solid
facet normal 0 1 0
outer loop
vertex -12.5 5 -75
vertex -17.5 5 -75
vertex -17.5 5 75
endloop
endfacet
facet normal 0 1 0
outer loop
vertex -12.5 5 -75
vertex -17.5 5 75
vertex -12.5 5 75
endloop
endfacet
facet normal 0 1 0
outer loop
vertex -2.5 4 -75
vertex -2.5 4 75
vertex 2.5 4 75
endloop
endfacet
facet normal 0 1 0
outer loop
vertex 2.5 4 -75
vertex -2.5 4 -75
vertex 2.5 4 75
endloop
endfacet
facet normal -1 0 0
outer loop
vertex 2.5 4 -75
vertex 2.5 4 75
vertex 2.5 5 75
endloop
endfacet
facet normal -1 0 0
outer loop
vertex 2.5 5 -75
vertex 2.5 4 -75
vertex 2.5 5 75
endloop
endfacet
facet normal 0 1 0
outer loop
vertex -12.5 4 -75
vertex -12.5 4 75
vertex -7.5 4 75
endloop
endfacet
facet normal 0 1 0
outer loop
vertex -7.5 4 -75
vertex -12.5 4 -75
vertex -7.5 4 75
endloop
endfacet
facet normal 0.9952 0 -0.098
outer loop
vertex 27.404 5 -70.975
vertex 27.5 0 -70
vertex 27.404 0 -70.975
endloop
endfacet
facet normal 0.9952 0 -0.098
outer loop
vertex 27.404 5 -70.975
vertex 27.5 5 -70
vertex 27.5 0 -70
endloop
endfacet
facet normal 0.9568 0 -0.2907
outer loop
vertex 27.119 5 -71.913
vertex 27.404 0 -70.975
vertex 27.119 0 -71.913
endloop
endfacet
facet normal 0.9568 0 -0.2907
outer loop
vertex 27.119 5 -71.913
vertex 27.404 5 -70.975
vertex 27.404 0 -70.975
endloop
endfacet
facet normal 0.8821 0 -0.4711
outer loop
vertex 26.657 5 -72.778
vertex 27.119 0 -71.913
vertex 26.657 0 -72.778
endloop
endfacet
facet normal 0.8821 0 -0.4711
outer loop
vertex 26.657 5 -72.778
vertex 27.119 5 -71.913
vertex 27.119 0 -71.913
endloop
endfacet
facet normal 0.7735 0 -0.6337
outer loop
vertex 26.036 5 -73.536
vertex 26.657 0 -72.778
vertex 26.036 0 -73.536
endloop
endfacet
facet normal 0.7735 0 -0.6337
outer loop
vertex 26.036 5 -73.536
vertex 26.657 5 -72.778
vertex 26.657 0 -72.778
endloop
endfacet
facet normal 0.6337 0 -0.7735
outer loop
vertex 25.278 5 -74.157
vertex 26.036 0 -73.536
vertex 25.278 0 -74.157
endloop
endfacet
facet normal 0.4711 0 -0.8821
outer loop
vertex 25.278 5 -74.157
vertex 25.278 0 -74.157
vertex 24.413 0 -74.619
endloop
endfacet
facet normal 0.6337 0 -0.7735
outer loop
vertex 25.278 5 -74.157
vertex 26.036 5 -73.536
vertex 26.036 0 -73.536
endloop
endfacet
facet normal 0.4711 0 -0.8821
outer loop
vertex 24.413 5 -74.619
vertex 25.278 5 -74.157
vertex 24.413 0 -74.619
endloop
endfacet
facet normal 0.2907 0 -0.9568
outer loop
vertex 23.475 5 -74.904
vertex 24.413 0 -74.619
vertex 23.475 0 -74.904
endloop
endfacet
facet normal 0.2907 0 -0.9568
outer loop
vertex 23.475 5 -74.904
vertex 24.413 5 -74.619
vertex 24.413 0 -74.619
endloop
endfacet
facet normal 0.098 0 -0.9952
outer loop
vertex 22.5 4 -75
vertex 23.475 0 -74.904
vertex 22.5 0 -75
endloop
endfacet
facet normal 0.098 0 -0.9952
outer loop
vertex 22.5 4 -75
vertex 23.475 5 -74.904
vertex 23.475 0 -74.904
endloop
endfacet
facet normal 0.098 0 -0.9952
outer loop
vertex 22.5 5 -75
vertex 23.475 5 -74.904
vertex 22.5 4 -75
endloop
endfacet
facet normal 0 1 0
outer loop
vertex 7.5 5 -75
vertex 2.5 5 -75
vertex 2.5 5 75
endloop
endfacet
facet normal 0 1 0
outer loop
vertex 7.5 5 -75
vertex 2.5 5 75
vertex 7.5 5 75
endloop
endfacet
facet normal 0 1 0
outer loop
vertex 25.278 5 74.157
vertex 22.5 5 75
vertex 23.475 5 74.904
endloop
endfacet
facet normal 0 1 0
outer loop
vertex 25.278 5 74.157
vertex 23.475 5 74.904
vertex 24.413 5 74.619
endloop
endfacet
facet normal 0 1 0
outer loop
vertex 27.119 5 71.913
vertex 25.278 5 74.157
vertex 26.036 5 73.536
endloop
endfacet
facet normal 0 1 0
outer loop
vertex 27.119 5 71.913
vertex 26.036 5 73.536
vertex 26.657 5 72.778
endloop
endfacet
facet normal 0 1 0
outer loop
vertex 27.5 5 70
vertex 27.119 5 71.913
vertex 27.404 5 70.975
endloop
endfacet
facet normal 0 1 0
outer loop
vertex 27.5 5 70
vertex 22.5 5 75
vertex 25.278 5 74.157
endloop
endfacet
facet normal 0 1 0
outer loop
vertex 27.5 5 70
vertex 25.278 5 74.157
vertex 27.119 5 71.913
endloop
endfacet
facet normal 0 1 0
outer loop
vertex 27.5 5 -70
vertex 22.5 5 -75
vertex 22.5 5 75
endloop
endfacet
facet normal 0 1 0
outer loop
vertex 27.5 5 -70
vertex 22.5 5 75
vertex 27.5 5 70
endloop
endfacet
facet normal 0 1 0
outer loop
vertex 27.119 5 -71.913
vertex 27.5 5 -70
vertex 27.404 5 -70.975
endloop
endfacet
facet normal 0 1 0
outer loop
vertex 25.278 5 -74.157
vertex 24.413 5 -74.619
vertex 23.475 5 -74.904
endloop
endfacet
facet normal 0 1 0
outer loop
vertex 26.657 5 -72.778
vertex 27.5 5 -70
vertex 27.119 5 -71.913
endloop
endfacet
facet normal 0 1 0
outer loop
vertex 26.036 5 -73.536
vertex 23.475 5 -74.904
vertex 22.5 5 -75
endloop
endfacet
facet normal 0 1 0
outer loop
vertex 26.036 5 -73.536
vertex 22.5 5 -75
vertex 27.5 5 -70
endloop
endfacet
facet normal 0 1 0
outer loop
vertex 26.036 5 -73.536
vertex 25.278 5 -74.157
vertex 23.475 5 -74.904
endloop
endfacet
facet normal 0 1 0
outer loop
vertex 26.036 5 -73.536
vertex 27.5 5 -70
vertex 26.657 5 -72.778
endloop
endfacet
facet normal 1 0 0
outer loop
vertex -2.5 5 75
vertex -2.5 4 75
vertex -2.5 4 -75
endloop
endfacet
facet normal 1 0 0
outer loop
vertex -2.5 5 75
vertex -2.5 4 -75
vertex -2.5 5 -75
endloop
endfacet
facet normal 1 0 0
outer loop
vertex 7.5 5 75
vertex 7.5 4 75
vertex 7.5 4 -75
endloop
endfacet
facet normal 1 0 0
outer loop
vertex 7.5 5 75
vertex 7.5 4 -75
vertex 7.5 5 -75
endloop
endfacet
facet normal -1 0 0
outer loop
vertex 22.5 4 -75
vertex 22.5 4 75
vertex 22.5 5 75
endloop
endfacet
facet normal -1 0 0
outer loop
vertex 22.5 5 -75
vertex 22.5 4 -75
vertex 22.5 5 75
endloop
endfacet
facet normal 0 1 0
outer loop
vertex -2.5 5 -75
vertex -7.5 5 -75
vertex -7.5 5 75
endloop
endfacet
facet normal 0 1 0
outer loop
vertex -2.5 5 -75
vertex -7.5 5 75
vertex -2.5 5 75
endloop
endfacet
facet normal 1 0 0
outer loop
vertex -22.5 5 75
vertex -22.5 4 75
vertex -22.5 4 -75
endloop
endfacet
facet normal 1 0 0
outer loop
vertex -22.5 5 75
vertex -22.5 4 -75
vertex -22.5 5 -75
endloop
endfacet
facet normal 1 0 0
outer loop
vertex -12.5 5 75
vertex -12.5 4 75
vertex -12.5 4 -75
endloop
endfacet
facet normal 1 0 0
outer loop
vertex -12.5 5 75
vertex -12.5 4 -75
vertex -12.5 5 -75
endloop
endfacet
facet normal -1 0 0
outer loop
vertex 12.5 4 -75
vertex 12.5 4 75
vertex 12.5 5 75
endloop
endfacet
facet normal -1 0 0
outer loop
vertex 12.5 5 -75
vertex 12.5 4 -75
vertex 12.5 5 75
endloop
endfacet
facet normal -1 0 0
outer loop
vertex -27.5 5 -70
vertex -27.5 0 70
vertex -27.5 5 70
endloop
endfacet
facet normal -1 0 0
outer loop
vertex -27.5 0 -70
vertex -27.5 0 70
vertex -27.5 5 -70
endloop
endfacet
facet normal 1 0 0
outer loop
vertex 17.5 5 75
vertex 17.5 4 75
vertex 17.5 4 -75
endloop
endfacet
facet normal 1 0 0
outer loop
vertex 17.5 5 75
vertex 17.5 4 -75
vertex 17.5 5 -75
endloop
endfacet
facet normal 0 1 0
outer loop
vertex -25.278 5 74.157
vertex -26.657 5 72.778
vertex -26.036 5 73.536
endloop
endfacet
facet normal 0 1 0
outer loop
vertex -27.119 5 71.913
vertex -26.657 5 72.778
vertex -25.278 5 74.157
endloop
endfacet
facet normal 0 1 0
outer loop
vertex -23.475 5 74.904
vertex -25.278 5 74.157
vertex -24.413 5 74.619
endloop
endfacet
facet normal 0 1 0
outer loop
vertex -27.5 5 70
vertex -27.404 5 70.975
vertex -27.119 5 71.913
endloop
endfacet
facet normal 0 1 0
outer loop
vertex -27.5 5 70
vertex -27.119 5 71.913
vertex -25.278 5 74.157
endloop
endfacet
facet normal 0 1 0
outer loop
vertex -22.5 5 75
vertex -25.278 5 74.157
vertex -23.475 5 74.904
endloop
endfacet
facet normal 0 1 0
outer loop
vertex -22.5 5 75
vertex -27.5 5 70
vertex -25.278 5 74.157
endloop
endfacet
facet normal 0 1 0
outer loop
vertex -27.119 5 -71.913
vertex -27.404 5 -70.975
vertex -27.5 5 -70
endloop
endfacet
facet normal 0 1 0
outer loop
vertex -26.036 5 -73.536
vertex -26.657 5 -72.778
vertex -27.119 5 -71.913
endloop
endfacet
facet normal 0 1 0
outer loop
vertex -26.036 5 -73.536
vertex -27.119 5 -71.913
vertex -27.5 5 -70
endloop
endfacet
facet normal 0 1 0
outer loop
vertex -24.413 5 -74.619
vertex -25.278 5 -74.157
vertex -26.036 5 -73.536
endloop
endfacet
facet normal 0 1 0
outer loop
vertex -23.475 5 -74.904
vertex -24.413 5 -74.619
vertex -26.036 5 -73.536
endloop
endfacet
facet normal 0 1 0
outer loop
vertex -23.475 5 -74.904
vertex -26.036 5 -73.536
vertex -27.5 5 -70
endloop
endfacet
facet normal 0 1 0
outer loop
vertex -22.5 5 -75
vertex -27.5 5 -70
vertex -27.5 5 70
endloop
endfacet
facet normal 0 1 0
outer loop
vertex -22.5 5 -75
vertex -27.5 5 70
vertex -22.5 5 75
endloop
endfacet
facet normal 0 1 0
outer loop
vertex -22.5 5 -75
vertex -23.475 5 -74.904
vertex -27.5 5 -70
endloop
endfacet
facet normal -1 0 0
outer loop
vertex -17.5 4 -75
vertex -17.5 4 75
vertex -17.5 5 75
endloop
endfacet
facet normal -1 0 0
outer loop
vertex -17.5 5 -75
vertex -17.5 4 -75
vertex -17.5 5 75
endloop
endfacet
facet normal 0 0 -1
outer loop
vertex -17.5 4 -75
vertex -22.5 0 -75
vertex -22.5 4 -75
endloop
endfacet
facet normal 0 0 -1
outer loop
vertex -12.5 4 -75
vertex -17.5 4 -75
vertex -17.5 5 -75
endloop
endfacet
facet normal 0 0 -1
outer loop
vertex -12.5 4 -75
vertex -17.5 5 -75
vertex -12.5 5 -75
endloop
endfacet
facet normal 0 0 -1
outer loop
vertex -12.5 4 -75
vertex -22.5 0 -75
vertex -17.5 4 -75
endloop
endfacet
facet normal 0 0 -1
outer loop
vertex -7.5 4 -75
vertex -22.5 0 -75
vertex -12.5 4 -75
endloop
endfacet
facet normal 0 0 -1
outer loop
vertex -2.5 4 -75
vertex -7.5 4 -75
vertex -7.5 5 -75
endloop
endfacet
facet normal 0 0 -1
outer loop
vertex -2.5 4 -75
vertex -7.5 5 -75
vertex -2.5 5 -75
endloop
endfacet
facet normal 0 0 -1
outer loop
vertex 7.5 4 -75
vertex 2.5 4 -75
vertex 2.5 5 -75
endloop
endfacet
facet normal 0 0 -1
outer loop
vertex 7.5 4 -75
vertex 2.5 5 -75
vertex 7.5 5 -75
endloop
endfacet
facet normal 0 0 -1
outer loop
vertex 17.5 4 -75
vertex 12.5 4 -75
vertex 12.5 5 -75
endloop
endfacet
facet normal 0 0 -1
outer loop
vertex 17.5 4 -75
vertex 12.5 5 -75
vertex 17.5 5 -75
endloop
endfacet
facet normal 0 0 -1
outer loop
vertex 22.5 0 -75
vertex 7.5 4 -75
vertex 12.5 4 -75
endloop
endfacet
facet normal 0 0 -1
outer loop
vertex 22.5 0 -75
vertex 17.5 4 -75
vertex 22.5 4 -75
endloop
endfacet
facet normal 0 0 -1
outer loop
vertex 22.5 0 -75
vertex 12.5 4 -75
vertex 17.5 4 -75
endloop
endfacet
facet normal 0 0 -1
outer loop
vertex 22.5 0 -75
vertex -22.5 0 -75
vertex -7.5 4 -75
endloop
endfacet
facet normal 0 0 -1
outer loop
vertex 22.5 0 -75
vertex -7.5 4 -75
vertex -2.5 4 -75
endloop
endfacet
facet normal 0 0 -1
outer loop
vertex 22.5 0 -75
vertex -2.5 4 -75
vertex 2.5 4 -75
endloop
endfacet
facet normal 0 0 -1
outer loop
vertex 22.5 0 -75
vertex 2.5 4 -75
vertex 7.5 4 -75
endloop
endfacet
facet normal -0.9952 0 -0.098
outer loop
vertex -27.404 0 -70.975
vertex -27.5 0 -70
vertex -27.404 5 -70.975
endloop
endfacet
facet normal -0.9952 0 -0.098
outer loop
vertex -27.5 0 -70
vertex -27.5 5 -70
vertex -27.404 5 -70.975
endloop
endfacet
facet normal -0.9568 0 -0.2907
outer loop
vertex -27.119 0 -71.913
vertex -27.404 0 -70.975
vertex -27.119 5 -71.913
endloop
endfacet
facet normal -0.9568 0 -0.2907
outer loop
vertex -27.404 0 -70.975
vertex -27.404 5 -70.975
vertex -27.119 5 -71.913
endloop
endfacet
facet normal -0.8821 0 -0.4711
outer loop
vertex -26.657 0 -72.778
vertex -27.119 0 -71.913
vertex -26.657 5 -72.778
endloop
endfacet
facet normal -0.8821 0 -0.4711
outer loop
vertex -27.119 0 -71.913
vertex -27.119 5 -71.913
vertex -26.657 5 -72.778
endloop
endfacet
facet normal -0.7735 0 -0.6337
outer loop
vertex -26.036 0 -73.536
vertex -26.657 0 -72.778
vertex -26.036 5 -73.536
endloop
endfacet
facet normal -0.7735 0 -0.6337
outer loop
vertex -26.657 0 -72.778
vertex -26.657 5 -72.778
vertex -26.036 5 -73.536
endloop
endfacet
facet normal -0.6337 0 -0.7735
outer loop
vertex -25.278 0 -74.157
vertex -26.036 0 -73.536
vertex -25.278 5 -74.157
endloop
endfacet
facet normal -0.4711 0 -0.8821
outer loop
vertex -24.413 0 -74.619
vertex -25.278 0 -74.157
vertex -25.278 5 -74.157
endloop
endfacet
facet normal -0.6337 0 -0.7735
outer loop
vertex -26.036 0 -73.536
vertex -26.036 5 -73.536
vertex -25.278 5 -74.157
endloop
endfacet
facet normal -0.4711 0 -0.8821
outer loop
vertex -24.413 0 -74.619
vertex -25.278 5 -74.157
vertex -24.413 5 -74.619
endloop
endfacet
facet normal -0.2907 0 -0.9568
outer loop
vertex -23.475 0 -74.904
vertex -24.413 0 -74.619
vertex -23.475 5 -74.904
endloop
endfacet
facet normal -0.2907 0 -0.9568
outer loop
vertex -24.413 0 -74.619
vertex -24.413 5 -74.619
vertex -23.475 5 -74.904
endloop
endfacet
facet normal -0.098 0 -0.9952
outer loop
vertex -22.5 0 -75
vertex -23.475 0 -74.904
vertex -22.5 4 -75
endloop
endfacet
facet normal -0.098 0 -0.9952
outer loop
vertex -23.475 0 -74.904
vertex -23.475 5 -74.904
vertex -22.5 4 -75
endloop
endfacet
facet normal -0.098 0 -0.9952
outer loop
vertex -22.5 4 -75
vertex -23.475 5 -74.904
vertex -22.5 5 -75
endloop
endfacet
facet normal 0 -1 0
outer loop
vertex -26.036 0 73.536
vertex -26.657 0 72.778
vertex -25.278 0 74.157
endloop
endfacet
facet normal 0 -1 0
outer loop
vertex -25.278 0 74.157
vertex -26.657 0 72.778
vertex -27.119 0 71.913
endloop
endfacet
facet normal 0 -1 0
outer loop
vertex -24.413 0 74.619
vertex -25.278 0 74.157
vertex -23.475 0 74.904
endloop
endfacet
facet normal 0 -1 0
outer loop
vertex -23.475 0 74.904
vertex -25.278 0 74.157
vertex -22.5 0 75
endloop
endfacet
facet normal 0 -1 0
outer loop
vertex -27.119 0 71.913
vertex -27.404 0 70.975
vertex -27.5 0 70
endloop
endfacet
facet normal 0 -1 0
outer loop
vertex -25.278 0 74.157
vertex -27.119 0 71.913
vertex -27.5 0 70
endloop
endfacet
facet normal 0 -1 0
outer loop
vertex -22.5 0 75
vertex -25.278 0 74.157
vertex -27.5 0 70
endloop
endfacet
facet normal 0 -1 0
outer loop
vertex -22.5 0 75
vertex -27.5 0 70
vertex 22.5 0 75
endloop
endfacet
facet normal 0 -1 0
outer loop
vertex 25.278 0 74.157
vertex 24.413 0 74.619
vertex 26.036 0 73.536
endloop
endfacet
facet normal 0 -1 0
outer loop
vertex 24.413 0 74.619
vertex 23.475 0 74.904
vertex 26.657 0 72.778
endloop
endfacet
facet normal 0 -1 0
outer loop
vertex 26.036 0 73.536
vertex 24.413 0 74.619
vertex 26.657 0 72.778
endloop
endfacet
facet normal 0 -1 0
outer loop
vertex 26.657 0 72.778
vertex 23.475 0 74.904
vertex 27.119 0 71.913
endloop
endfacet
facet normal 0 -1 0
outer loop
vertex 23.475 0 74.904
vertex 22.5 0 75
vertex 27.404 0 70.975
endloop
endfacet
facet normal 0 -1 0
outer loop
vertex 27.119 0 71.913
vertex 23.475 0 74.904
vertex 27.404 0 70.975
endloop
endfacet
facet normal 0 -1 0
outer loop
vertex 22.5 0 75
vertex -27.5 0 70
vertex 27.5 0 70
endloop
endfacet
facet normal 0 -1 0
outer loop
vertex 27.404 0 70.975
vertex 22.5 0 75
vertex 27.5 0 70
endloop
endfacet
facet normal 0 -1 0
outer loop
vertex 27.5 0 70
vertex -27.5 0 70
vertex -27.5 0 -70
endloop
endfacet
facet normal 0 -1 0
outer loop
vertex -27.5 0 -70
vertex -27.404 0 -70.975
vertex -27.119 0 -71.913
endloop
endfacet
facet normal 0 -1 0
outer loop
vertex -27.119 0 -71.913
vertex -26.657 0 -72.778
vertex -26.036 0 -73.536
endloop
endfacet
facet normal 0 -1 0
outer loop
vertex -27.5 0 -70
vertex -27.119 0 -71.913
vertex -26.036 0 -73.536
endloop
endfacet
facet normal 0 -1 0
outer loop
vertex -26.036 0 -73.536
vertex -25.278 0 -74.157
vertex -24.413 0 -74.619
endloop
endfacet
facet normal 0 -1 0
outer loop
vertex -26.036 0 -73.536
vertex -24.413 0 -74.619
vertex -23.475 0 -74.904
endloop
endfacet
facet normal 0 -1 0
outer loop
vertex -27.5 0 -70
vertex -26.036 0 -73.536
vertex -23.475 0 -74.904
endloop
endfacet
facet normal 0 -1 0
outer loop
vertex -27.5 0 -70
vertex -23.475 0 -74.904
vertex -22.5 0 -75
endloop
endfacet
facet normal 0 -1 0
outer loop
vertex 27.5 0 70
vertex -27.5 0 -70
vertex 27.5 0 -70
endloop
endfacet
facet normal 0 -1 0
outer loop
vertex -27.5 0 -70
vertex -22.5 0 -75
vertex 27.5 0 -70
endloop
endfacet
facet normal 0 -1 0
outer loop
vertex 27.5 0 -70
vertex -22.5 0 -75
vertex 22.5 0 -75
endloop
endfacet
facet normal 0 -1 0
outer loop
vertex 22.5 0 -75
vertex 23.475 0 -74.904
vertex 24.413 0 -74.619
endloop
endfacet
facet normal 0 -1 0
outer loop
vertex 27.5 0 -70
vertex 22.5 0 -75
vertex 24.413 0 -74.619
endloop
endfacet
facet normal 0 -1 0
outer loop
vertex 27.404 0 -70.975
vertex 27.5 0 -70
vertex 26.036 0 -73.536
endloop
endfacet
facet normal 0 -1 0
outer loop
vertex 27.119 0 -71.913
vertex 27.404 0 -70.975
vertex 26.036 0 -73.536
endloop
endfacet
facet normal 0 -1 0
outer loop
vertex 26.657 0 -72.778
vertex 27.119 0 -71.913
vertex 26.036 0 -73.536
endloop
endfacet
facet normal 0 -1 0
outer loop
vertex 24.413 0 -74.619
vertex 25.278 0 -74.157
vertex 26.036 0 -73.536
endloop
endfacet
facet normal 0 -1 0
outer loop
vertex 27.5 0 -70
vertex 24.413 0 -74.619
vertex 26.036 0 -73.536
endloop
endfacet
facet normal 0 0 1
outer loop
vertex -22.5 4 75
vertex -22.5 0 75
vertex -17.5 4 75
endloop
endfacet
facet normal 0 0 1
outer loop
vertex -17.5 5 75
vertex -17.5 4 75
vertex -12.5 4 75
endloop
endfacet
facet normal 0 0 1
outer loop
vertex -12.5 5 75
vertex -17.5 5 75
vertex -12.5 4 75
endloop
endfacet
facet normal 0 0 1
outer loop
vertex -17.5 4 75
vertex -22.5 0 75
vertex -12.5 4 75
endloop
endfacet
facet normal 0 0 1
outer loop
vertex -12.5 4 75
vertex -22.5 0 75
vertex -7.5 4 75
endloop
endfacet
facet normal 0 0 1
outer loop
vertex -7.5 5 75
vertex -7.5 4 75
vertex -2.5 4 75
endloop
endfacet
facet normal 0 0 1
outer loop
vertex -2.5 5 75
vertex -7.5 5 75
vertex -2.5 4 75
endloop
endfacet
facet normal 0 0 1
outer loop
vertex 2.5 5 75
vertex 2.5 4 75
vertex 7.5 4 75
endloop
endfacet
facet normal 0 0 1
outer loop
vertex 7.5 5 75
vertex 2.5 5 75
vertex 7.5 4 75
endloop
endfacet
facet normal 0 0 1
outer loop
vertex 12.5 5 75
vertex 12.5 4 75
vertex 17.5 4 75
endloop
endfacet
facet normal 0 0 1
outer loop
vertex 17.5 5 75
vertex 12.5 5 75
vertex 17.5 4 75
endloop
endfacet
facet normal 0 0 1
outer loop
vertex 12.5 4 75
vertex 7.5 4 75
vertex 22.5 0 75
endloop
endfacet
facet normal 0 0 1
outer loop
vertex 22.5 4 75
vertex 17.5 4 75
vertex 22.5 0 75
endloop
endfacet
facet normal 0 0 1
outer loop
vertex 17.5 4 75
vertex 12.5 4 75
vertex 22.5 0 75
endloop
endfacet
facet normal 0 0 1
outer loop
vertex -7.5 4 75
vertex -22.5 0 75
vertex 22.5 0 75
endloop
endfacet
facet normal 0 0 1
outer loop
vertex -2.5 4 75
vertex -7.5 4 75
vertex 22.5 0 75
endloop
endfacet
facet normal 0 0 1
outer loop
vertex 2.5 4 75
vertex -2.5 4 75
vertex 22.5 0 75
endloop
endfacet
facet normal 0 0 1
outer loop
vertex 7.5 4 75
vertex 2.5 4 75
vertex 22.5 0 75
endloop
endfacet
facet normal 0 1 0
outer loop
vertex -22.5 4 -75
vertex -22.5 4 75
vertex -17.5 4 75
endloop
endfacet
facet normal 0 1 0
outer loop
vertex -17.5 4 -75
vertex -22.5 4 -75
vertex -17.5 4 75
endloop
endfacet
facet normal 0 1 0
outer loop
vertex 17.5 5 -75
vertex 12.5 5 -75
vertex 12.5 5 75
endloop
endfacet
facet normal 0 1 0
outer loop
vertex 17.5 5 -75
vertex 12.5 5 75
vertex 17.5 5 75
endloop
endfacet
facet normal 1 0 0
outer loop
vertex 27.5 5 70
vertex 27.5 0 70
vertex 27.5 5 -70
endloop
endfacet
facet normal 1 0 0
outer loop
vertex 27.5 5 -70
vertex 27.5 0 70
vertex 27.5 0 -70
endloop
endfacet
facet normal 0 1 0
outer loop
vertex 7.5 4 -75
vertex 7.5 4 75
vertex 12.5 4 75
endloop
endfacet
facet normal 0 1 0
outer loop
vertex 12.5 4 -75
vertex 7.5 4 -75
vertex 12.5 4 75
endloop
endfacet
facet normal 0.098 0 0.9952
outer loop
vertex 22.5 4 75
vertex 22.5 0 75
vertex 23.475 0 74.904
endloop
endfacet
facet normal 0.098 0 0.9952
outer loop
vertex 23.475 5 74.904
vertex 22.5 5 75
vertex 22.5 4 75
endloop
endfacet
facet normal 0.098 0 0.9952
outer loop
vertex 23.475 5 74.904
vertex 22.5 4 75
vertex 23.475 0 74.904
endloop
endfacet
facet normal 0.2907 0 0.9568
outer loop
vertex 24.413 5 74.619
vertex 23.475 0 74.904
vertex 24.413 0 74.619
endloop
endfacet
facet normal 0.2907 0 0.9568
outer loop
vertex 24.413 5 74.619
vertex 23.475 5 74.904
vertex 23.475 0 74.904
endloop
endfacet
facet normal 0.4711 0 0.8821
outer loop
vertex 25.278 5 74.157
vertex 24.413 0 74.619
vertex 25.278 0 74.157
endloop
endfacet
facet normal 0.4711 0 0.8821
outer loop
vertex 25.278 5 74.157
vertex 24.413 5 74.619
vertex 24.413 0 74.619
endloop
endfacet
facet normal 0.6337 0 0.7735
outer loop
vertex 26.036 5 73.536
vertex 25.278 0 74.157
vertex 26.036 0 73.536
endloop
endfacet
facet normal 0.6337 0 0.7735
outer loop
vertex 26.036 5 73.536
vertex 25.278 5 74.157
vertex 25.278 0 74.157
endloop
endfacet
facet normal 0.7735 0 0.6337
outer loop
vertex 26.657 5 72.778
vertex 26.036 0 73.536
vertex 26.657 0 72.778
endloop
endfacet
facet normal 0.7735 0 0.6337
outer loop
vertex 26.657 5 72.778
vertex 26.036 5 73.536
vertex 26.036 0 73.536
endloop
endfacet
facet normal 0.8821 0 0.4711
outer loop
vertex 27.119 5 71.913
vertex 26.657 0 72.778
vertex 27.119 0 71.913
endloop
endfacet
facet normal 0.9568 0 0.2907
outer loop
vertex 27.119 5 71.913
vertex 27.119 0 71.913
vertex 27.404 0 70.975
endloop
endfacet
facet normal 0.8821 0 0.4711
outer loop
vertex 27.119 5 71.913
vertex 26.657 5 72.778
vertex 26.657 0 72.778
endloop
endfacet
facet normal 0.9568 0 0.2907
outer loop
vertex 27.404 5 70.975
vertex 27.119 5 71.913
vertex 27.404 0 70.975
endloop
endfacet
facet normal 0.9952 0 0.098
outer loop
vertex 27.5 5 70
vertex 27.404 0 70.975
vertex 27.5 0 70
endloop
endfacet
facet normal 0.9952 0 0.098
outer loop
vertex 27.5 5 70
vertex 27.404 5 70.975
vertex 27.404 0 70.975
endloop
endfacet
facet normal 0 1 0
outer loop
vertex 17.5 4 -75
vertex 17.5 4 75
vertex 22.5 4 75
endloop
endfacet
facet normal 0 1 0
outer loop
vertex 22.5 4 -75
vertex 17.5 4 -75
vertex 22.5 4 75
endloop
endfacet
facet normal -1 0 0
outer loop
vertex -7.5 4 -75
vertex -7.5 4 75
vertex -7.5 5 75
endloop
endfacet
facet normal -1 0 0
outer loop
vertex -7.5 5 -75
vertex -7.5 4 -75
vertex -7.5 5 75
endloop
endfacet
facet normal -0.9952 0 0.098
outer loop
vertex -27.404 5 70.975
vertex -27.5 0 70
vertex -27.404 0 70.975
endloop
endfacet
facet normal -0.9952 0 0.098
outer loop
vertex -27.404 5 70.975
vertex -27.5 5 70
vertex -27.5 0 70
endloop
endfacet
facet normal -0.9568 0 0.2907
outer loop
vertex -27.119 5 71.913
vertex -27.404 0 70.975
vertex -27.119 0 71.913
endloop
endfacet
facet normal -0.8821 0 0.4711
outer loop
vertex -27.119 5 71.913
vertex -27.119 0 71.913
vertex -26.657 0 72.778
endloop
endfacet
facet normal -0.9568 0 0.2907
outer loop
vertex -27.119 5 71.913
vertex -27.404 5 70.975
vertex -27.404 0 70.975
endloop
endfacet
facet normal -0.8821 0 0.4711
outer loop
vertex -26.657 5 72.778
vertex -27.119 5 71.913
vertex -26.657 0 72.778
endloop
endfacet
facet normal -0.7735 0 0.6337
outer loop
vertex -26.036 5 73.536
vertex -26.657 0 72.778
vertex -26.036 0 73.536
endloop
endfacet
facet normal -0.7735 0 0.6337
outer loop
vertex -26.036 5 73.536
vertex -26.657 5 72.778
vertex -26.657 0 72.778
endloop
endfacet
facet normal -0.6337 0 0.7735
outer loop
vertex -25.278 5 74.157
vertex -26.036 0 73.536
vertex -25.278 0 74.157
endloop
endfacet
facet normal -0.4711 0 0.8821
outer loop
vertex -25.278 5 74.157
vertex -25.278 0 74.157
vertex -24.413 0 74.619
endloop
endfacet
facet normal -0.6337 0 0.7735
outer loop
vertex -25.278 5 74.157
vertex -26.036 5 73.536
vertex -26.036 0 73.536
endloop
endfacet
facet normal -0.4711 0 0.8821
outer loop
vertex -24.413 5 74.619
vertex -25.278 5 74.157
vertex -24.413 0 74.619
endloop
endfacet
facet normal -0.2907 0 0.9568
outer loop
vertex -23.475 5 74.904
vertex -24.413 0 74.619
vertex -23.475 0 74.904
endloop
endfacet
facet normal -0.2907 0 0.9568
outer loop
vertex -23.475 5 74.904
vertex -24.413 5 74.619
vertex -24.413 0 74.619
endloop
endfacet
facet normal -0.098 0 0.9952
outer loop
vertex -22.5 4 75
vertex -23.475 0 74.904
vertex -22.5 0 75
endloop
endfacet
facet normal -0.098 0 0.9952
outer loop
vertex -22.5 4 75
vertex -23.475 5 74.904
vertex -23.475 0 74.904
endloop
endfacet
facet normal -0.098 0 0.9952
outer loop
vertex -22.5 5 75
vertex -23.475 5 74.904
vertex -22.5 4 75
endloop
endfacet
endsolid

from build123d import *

# Parameters (mm, degrees)
SKETCH2_W           = 55
SKETCH2_H           = 150
BOSS_EXTRUDE1_DEPTH = 5
FILLET1_R           = 5
SKETCH4_W           = 5
SKETCH4_H           = 1
CUT_EXTRUDE1_DEPTH  = 153.581945197
LPATTERN1_COUNT     = 5
LPATTERN1_PITCH     = 10


with BuildPart() as part:
    # Sketch2 → Boss-Extrude1 (new body)
    with BuildSketch(Plane(origin=(0, 0, 0), x_dir=(1, 0, 0), z_dir=(0, 1, 0))):
        Rectangle(SKETCH2_W, SKETCH2_H)
    extrude(amount=BOSS_EXTRUDE1_DEPTH)

    # Fillet1
    fillet1_edges = [part.edges().sort_by_distance(p)[0] for p in [
        (27.5, 2.5, 75),
        (-27.5, 2.5, 75),
        (-27.5, 2.5, -75),
        (27.5, 2.5, -75),
    ]]
    fillet(fillet1_edges, radius=FILLET1_R)

    # Sketch4 → Cut-Extrude1 (cut, through all)
    with BuildSketch(Plane.XY.offset(75)):
        with Locations((-20, 4.5)):
            Rectangle(SKETCH4_W, SKETCH4_H)
    cut_extrude1 = extrude(amount=-CUT_EXTRUDE1_DEPTH, mode=Mode.SUBTRACT)

    # LPattern1: Cut-Extrude1 ×5
    with Locations(*[(i * LPATTERN1_PITCH, 0, 0) for i in range(1, LPATTERN1_COUNT)]):
        add(cut_extrude1, mode=Mode.SUBTRACT)


solid = part.part
